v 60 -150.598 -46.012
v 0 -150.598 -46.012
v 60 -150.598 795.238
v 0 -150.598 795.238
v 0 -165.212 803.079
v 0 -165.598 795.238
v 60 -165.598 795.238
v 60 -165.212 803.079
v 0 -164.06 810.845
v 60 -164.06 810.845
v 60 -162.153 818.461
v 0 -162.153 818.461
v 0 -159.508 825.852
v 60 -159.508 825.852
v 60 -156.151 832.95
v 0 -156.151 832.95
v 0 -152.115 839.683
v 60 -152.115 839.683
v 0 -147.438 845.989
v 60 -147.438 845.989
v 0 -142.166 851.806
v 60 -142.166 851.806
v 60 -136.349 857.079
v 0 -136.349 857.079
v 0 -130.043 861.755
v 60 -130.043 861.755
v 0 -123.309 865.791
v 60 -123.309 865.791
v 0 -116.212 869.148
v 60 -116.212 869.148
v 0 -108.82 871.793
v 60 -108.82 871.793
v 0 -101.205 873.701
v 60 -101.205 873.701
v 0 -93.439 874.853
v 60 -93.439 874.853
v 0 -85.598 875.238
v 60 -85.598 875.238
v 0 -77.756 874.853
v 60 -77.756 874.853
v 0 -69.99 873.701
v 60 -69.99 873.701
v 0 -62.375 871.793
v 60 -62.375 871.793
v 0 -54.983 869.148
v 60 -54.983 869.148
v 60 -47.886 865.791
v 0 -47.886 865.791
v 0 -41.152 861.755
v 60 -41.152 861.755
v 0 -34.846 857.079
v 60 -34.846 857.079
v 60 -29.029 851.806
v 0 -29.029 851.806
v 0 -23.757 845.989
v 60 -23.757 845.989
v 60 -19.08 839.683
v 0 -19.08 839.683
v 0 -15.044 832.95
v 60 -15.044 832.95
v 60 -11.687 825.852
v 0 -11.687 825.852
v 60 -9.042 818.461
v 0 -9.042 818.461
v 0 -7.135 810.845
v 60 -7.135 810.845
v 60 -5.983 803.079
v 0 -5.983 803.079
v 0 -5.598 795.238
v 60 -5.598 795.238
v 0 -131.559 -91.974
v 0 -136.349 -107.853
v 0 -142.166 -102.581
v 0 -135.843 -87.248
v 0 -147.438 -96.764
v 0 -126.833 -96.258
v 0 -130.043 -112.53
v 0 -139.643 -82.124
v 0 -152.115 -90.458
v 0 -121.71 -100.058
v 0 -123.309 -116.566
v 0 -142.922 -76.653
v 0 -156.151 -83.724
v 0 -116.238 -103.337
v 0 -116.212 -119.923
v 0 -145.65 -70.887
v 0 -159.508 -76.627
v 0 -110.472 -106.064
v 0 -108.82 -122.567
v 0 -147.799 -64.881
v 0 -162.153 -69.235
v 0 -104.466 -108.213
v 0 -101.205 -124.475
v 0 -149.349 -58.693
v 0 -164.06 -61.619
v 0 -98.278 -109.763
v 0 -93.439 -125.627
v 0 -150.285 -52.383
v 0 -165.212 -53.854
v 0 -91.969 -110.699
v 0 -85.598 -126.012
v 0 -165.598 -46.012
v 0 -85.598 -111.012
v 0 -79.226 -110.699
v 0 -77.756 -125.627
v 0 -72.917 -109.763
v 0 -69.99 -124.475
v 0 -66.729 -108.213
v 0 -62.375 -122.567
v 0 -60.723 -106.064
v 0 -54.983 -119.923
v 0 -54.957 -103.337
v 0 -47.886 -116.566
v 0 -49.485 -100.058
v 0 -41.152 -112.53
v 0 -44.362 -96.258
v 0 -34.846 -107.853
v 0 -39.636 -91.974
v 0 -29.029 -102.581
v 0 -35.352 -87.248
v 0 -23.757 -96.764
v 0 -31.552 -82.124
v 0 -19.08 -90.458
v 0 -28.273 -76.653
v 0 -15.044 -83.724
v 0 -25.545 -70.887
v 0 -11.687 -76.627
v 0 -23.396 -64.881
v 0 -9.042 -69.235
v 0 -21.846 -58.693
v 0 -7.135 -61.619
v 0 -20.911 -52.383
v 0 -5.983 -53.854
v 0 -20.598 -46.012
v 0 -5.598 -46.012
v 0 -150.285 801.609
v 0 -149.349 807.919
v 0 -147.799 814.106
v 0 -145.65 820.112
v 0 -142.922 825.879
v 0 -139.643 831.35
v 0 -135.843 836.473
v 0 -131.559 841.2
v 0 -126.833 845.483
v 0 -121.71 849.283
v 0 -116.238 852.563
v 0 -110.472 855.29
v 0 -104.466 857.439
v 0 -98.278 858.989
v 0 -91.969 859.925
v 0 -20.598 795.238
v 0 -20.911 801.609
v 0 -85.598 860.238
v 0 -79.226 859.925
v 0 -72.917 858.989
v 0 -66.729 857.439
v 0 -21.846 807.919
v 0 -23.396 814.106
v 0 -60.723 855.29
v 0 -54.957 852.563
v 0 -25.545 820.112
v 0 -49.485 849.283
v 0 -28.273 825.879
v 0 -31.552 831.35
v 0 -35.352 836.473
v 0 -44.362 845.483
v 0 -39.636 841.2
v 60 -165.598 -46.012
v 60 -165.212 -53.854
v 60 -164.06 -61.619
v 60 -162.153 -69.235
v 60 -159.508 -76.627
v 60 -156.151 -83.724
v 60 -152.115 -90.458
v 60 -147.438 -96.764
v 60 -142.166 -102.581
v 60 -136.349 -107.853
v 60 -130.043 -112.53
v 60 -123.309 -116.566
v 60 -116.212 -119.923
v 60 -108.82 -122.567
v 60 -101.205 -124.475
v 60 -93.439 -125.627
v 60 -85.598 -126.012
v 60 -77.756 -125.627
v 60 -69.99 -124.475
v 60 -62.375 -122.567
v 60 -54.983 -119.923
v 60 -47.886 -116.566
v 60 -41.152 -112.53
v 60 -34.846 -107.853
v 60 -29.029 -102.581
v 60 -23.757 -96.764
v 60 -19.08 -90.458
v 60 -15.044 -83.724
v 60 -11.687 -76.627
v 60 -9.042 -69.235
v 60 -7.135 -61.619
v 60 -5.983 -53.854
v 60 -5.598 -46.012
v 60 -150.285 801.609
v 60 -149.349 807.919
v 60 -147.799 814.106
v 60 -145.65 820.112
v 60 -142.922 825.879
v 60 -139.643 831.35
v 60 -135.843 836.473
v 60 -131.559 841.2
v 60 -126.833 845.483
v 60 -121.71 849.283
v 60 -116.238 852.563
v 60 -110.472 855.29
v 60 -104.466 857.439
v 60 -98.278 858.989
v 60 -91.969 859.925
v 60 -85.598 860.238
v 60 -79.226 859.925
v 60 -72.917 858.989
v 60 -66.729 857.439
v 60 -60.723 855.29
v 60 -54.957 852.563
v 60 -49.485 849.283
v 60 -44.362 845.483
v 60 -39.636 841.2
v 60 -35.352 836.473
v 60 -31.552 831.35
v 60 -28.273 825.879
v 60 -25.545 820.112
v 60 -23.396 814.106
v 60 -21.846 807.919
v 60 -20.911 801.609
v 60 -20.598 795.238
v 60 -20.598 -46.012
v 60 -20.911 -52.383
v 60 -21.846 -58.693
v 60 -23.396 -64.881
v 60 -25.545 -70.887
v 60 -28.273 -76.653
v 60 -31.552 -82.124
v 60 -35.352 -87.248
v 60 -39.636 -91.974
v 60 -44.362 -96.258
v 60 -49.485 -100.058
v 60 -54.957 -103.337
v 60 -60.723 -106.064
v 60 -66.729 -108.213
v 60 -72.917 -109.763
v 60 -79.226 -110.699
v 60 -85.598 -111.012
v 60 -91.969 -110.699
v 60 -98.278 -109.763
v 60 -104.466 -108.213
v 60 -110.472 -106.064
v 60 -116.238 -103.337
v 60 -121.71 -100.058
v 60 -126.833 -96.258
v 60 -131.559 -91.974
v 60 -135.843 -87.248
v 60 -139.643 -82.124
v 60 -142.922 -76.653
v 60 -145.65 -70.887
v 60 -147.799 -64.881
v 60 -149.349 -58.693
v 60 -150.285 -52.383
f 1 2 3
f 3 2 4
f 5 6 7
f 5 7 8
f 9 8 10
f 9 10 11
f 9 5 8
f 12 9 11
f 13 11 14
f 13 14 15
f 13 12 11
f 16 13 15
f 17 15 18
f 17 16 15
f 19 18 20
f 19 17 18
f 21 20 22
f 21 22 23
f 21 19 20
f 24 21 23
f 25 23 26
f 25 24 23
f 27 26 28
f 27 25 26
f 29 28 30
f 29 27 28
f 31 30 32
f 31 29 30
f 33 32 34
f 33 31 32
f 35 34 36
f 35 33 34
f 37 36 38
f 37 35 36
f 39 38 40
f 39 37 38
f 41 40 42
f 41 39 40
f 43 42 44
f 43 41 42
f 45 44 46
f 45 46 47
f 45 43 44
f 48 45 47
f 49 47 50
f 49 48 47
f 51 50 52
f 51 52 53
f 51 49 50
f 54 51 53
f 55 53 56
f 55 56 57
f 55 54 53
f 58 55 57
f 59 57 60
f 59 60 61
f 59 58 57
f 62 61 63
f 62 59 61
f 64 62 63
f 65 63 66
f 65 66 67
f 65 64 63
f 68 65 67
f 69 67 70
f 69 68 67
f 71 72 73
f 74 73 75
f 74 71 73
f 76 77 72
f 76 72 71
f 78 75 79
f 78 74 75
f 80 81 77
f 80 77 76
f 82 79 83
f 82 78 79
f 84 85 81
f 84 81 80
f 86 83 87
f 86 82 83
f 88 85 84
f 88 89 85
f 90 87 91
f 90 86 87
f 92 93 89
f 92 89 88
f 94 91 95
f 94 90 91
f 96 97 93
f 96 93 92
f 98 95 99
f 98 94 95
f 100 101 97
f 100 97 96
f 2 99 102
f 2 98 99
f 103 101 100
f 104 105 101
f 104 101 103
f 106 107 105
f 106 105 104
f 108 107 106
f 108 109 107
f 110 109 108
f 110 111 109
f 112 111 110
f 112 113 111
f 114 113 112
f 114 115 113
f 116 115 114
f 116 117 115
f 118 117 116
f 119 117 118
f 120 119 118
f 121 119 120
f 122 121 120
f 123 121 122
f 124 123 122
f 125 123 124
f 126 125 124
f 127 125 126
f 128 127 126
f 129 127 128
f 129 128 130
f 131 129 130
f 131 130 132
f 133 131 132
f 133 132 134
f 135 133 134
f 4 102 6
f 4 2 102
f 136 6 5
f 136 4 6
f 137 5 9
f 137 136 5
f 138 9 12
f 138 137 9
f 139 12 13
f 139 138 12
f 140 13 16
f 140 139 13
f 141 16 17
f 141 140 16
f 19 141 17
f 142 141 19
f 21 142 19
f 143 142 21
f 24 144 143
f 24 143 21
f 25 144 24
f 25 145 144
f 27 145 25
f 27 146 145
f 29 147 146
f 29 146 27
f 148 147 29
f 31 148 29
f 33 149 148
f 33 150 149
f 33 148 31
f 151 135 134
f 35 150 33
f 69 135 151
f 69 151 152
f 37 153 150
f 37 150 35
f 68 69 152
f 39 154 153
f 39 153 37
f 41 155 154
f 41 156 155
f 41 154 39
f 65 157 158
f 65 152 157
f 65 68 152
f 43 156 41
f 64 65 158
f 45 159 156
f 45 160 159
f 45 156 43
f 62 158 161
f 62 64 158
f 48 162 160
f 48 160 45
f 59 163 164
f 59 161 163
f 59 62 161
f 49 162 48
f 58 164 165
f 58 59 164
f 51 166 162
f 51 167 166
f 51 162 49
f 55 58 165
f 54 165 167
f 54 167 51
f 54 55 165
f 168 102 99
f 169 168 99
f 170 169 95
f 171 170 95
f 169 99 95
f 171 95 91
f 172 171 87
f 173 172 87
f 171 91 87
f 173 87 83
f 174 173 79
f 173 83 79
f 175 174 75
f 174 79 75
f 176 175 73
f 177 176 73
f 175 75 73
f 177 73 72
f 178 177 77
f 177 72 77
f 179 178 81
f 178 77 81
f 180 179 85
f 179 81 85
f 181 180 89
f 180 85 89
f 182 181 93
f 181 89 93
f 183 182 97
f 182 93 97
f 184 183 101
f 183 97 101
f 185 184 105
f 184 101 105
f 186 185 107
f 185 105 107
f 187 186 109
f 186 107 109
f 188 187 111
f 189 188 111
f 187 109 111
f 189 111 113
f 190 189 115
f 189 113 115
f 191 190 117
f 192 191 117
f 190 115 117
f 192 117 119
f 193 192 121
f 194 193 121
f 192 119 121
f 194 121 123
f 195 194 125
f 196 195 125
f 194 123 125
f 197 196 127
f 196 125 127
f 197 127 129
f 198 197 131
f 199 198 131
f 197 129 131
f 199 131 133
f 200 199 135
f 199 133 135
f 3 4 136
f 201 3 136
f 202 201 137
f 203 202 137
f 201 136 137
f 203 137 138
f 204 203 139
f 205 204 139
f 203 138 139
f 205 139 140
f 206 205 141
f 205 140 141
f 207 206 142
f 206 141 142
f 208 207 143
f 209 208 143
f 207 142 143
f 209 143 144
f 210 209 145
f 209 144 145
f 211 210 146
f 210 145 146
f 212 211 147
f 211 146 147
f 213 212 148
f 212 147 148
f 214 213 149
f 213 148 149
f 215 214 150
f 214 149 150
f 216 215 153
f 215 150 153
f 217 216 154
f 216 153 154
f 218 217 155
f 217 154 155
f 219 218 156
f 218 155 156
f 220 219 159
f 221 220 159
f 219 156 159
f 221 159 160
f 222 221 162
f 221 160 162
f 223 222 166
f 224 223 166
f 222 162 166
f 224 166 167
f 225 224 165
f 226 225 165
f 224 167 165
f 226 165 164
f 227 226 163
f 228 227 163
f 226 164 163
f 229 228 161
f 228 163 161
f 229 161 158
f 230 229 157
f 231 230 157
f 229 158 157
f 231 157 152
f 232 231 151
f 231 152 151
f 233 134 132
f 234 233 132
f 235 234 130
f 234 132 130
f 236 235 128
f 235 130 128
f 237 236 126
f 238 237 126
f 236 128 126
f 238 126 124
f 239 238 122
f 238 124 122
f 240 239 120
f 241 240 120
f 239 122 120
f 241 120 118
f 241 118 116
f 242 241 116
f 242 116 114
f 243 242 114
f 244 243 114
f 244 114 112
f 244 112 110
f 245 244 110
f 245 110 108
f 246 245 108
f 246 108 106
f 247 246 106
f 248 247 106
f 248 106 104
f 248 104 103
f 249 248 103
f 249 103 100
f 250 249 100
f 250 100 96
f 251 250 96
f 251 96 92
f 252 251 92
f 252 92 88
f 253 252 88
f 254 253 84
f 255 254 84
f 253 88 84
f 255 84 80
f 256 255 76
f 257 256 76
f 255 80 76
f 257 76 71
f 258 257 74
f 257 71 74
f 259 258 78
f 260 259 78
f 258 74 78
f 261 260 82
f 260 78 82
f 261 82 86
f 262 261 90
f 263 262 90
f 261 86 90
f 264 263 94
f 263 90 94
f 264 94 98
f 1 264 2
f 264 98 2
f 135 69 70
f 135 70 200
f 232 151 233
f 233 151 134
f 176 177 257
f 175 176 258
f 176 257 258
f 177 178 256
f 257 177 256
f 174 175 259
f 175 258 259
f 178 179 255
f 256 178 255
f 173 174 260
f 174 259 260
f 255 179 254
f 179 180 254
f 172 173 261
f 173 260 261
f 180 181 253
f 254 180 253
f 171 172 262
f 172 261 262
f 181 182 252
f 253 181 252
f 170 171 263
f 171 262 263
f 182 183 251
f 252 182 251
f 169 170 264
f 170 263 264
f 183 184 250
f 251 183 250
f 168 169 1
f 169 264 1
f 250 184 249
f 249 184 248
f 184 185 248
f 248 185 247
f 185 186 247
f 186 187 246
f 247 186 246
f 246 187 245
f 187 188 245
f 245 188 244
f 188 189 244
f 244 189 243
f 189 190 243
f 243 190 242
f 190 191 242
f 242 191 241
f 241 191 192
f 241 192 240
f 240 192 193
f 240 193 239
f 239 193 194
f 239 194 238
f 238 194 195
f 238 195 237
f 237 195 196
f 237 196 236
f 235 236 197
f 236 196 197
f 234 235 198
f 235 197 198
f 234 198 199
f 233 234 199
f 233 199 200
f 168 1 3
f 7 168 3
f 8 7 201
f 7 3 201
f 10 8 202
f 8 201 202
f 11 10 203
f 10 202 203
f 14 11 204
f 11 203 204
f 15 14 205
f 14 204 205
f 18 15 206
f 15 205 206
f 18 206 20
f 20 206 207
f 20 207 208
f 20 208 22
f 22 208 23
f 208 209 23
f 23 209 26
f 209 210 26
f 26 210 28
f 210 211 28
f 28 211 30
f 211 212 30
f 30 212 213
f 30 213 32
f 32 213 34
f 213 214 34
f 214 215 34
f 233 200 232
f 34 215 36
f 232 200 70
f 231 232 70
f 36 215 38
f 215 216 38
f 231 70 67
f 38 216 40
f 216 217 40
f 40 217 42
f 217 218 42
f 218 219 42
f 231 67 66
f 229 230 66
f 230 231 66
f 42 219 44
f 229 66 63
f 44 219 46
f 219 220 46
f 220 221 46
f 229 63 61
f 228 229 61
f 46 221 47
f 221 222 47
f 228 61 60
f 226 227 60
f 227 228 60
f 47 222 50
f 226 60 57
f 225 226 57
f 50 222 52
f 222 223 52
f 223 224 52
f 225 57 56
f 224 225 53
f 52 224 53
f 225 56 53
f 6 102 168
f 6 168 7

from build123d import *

# Parameters (mm, degrees)
SKETCH_1_R               = 18.541316536
EXTRUDE_1_DEPTH          = 10
SKETCH_2_R               = 65
EXTRUDE_2_DEPTH          = 60
CUT_EXTRUDE_1_DEPTH      = 554.983106248
CUT_EXTRUDE_1_DEPTH_BACK = 554.983106248
CUT_EXTRUDE_2_DEPTH      = 554.983106248
CUT_EXTRUDE_2_DEPTH_BACK = 554.983106248
SKETCH_4_W               = 491.25
SKETCH_4_H               = 130
EXTRUDE_START            = -60
EXTRUDE_3_DEPTH          = 60
CUT_EXTRUDE_3_DEPTH      = 229


with BuildPart() as part:
    # 草图1 → 凸台-拉伸1 (new body)
    with BuildSketch(Plane(origin=(0, 0, 0), x_dir=(0, 0, -1), z_dir=(1, 0, 0))):
        Circle(SKETCH_1_R)
    extrude(amount=EXTRUDE_1_DEPTH)

    # 草图2 → 凸台-拉伸2 (add)
    with BuildSketch(Plane.ZY):
        with BuildLine():
            Line((-46.012206562, -5.59753124), (445.237793438, -5.59753124))
            ThreePointArc((445.237793438, -5.59753124), (525.237793438, -85.59753124), (445.237793438, -165.59753124))
            Line((445.237793438, -165.59753124), (-46.012206562, -165.59753124))
            ThreePointArc((-46.012206562, -165.59753124), (-126.012206562, -85.59753124), (-46.012206562, -5.59753124))
        make_face()
        with Locations((-46.012206562, -85.59753124)):
            Circle(SKETCH_2_R, mode=Mode.SUBTRACT)
        with Locations((445.237793438, -85.59753124)):
            Circle(SKETCH_2_R, mode=Mode.SUBTRACT)
    extrude(amount=-EXTRUDE_2_DEPTH)

    # 草图3 → 切除-拉伸1 (cut, two sides: drawn at the far end of the back side and taken through both)
    with BuildSketch(Plane.ZY.offset(-CUT_EXTRUDE_1_DEPTH_BACK)):
        Polygon((-32.271946136, -5.59753124), (45.25223132, -5.59753124), (36.799677621, 39.571185564), (-16.420104924, 39.571185564), align=None)
    extrude(amount=CUT_EXTRUDE_1_DEPTH + CUT_EXTRUDE_1_DEPTH_BACK, mode=Mode.SUBTRACT)

    # 草图4 → 切除-拉伸2 (cut, two sides: drawn at the far end of the back side and taken through both)
    with BuildSketch(Plane.ZY.offset(-CUT_EXTRUDE_2_DEPTH_BACK)):
        with Locations((199.612793438, -85.59753124)):
            Rectangle(SKETCH_4_W, SKETCH_4_H)
    extrude(amount=CUT_EXTRUDE_2_DEPTH + CUT_EXTRUDE_2_DEPTH_BACK, mode=Mode.SUBTRACT)

    # 草图6 → 凸台-拉伸3 (add)
    with BuildSketch(Plane(origin=(60, 0, 0), x_dir=(0, 0, -1), z_dir=(1, 0, 0)).offset(EXTRUDE_START)):
        with BuildLine():
            Line((-795.237793438, -5.59753124), (46.012206562, -5.59753124))
            ThreePointArc((46.012206562, -5.59753124), (126.012206562, -85.59753124), (46.012206562, -165.59753124))
            Line((46.012206562, -165.59753124), (-795.237793438, -165.59753124))
            ThreePointArc((-795.237793438, -165.59753124), (-875.237793438, -85.59753124), (-795.237793438, -5.59753124))
        make_face()
        with BuildLine():
            Line((-795.237793438, -20.59753124), (46.012206562, -20.59753124))
            ThreePointArc((46.012206562, -20.59753124), (111.012206562, -85.59753124), (46.012206562, -150.59753124))
            Line((46.012206562, -150.59753124), (-795.237793438, -150.59753124))
            ThreePointArc((-795.237793438, -150.59753124), (-860.237793438, -85.59753124), (-795.237793438, -20.59753124))
        make_face(mode=Mode.SUBTRACT)
    extrude(amount=EXTRUDE_3_DEPTH)

    # 草图7 → 切除-拉伸3 (cut)
    with BuildSketch(Plane(origin=(60, 0, 0), x_dir=(0, 0, -1), z_dir=(1, 0, 0))):
        Polygon((-547.566166751, -20.59753124), (-408.942471001, -20.59753124), (-408.942471001, -150.59753124), (-543.921935574, -150.59753124), align=None)
    extrude(amount=-CUT_EXTRUDE_3_DEPTH, mode=Mode.SUBTRACT)


solid = part.part
